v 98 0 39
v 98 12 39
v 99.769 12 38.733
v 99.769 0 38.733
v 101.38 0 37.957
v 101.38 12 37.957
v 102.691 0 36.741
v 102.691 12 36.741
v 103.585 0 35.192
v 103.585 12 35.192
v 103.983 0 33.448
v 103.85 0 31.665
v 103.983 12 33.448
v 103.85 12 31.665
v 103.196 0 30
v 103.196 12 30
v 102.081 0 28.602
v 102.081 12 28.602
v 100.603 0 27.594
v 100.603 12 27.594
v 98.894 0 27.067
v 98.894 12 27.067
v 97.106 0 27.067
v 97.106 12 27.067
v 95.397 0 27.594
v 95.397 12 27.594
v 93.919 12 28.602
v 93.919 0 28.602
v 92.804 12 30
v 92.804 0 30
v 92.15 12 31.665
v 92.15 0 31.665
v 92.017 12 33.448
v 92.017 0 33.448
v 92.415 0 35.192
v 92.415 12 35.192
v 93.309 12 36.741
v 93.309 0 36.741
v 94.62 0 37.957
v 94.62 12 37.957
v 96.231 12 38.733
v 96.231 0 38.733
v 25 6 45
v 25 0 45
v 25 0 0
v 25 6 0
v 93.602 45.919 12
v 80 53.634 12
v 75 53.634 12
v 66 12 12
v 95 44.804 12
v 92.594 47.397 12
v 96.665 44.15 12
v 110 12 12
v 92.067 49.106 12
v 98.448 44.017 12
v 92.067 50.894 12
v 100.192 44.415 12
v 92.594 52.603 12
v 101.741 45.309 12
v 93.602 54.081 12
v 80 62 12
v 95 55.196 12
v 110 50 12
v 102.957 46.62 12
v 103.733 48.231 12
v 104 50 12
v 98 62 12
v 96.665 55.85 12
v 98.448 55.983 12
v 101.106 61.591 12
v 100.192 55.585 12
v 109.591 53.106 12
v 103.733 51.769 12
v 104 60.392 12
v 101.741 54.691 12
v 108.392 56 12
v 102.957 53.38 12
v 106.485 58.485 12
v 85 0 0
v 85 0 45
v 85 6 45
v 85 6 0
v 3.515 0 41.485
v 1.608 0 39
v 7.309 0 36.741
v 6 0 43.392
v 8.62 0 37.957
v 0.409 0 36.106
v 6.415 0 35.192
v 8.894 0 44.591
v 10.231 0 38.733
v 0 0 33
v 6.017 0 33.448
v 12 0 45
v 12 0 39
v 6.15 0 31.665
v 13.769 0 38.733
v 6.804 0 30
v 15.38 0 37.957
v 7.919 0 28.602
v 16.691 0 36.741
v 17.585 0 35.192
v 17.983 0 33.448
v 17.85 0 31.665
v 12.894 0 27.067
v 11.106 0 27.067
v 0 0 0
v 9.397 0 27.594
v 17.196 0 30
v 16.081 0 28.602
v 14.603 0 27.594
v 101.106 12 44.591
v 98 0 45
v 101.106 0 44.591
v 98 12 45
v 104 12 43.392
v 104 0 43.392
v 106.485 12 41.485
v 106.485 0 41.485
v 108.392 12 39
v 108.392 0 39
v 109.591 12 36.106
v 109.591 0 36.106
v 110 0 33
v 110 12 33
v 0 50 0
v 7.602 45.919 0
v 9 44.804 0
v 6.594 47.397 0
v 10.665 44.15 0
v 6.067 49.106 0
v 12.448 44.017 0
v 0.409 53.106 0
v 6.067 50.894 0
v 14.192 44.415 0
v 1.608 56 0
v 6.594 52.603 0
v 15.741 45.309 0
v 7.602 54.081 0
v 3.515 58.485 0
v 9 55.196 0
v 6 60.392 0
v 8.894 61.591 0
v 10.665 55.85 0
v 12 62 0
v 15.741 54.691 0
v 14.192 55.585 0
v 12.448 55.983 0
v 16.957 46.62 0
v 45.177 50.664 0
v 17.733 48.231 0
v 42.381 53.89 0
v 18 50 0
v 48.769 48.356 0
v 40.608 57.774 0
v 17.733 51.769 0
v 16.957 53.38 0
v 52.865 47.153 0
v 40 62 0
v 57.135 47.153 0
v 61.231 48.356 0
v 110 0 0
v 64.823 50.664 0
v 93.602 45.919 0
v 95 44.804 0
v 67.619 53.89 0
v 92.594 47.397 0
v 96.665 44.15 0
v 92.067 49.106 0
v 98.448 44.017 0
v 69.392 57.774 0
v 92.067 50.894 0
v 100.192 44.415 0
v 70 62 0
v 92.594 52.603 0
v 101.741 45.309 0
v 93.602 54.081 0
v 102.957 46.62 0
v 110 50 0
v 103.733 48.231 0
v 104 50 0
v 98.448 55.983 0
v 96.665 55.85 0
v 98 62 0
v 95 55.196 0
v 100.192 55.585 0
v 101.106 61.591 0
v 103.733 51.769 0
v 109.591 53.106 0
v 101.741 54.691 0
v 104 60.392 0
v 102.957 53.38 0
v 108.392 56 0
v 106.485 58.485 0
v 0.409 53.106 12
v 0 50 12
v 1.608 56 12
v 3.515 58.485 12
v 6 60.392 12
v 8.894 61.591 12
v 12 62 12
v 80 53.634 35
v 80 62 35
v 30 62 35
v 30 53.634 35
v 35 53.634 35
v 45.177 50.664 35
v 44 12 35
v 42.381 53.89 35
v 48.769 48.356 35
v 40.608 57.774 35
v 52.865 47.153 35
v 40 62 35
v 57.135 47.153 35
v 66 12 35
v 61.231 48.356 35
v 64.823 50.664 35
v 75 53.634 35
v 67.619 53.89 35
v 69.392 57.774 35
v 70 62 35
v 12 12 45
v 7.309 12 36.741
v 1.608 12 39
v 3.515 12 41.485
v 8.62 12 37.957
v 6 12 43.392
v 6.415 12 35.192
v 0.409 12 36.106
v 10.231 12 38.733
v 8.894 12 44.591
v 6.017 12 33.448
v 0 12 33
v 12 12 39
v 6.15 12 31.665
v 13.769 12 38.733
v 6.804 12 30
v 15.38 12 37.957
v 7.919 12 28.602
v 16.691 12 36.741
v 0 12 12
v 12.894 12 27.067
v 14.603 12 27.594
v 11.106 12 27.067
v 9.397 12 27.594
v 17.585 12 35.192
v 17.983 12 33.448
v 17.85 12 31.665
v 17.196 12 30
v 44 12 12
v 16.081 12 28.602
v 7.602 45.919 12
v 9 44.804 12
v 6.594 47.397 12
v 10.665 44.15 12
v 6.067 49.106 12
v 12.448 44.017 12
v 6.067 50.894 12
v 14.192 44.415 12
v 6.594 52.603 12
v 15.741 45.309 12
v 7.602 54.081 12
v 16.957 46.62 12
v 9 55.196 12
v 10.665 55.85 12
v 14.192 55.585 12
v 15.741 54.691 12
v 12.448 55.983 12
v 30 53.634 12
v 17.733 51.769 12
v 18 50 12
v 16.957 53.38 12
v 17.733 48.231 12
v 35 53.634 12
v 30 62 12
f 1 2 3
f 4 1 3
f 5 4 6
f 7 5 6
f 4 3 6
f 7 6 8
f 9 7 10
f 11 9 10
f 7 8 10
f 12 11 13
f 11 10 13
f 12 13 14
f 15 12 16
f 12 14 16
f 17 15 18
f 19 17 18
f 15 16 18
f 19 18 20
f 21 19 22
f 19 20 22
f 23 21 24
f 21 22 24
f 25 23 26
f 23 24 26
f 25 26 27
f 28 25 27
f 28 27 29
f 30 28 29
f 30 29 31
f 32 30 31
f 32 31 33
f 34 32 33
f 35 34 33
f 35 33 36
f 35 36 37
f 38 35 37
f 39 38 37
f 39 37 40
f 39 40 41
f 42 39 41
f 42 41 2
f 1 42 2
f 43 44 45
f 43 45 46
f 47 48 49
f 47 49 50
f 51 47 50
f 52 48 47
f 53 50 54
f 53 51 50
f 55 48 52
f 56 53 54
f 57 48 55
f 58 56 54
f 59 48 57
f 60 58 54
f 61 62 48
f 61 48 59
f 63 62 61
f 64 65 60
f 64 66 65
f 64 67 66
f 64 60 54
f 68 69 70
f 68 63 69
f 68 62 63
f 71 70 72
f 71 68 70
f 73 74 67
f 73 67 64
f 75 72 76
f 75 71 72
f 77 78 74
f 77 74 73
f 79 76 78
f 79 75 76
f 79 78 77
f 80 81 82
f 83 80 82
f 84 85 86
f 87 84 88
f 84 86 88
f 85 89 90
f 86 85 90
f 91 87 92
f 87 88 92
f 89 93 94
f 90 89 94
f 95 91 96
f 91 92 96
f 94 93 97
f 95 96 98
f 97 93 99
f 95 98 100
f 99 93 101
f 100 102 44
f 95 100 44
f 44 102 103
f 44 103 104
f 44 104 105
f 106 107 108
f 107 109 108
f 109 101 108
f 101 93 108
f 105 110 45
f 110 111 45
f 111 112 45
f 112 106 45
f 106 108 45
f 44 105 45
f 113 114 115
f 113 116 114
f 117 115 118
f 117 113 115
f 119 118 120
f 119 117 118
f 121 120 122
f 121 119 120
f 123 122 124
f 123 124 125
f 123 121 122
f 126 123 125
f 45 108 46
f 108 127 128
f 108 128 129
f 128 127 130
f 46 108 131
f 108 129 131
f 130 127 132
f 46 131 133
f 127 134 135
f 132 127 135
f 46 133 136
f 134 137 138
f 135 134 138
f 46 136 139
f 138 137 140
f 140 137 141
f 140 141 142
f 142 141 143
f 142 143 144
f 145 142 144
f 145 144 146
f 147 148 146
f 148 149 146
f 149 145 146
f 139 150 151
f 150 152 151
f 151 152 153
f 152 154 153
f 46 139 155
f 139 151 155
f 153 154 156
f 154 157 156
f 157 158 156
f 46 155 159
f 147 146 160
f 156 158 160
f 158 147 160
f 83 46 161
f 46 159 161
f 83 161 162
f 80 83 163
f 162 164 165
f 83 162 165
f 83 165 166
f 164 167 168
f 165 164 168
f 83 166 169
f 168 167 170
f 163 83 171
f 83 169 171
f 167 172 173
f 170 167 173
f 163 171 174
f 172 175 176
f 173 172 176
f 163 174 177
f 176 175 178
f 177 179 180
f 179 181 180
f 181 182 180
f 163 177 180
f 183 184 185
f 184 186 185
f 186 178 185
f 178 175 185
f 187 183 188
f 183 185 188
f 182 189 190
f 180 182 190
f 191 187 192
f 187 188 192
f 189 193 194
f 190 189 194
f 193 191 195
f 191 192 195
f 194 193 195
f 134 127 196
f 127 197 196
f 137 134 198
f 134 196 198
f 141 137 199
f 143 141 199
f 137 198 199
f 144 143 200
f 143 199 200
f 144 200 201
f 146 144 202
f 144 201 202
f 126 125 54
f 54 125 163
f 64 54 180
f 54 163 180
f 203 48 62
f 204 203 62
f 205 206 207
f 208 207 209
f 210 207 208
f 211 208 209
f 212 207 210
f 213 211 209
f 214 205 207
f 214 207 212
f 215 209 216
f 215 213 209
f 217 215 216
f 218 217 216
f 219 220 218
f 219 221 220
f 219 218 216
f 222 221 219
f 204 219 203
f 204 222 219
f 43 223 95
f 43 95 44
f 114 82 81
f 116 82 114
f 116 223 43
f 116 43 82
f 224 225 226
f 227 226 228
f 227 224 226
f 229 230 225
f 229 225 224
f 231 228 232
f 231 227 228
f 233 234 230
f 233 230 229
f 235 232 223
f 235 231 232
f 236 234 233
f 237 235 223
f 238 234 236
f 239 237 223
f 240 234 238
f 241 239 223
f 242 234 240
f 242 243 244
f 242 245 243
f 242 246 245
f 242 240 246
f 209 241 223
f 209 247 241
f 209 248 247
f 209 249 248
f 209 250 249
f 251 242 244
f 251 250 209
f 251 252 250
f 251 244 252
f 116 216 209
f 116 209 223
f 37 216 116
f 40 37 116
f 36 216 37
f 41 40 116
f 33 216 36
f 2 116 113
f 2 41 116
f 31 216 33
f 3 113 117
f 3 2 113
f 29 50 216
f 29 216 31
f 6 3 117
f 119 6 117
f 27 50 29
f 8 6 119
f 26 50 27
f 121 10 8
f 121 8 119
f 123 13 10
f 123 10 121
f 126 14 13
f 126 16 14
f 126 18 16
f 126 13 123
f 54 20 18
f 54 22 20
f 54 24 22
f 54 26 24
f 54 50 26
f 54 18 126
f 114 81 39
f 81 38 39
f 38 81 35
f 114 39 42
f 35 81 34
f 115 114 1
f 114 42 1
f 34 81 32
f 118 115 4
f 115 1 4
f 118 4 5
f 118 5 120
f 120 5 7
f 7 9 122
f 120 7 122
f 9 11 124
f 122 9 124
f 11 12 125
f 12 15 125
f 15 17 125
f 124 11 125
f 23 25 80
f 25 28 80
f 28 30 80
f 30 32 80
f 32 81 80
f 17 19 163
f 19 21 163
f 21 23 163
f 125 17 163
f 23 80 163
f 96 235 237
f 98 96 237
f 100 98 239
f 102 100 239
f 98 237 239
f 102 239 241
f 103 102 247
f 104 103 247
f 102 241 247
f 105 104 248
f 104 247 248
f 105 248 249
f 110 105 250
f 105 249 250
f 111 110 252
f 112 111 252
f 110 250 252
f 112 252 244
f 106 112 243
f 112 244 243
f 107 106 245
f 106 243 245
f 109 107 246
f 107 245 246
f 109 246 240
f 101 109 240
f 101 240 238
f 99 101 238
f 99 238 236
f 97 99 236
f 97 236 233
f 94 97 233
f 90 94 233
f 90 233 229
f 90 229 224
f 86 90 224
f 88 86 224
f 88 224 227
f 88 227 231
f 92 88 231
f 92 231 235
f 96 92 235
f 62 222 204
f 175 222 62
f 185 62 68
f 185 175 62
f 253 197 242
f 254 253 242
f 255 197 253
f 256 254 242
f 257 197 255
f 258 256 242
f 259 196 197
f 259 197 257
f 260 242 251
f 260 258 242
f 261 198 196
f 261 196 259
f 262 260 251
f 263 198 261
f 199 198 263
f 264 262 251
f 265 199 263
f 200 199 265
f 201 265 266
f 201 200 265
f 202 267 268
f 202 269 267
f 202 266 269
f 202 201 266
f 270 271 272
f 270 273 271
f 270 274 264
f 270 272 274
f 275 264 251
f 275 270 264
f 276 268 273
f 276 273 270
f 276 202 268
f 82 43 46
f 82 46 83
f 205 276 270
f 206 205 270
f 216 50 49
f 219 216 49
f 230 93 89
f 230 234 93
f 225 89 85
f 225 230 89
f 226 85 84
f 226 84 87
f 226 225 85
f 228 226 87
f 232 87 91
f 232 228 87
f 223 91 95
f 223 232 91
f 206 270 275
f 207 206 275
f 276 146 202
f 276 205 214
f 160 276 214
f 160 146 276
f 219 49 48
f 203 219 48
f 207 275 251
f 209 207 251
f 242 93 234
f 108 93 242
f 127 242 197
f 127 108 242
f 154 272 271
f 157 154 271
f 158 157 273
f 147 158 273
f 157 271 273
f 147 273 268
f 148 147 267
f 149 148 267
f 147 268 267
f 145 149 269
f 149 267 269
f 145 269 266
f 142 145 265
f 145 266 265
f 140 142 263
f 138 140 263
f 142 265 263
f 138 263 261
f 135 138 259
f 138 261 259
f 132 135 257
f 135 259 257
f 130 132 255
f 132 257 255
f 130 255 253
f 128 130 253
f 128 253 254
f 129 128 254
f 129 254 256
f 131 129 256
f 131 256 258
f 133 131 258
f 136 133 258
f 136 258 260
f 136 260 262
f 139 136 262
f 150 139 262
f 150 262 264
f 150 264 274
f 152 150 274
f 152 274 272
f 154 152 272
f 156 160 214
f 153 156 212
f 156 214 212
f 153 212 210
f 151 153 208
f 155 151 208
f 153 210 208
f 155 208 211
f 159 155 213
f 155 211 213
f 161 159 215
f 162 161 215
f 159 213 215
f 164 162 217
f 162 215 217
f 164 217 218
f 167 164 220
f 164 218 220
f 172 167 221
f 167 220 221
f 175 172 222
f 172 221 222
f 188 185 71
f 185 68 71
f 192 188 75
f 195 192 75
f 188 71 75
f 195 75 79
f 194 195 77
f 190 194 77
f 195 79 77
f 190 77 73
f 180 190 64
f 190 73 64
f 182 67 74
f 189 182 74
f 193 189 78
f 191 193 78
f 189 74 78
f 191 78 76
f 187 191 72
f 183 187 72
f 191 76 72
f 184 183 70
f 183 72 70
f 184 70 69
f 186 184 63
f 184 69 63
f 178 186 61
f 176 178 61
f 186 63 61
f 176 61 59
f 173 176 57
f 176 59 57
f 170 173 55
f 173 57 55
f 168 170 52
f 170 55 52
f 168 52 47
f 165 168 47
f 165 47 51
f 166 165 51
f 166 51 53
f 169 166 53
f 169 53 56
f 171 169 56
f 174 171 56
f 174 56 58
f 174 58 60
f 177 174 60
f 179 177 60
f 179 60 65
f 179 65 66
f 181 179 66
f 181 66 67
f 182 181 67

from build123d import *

# Parameters (mm, degrees)
SKETCH1_W           = 110
SKETCH1_H           = 62
BOSS_EXTRUDE1_DEPTH = 12
SKETCH2_W           = 110
SKETCH2_H           = 12
BOSS_EXTRUDE2_DEPTH = 33
BOSS_EXTRUDE3_DEPTH = 23
SKETCH7_R           = 6
CUT_EXTRUDE8_DEPTH  = 131.510535973
SKETCH9_R           = 6
CUT_EXTRUDE9_DEPTH  = 131.510535973
SKETCH10_R          = 6
CUT_EXTRUDE10_DEPTH = 129.937969582
SKETCH11_R          = 6
CUT_EXTRUDE11_DEPTH = 129.937969582
SKETCH15_W          = 60
SKETCH15_H          = 6
CUT_EXTRUDE15_DEPTH = 135.048498686
FILLET3_R           = 12
SKETCH16_R          = 15
CUT_EXTRUDE16_DEPTH = 132.030530793


with BuildPart() as part:
    # Sketch1 → Boss-Extrude1 (new body)
    with BuildSketch(Plane.XY):
        with Locations((55, 31)):
            Rectangle(SKETCH1_W, SKETCH1_H)
    extrude(amount=BOSS_EXTRUDE1_DEPTH)

    # Sketch2 → Boss-Extrude2 (add)
    with BuildSketch(Plane.XY.offset(12)):
        with Locations((55, 6)):
            Rectangle(SKETCH2_W, SKETCH2_H)
    extrude(amount=BOSS_EXTRUDE2_DEPTH)

    # Sketch3 → Boss-Extrude3 (add)
    with BuildSketch(Plane.XY.offset(12)):
        Polygon((75, 53.634363687), (35, 53.634363687), (44, 12), (66, 12), align=None)
        Polygon((80, 62), (30, 62), (30, 53.634363687), (35, 53.634363687), (75, 53.634363687), (80, 53.634363687), align=None)
    extrude(amount=BOSS_EXTRUDE3_DEPTH)

    # Sketch7 → Cut-Extrude8 (cut, through all)
    with BuildSketch(Plane.XY.offset(12)):
        with Locations((12, 50)):
            Circle(SKETCH7_R)
    extrude(amount=-CUT_EXTRUDE8_DEPTH, mode=Mode.SUBTRACT)

    # Sketch9 → Cut-Extrude9 (cut, through all)
    with BuildSketch(Plane.XY.offset(12)):
        with Locations((98, 50)):
            Circle(SKETCH9_R)
    extrude(amount=-CUT_EXTRUDE9_DEPTH, mode=Mode.SUBTRACT)

    # Sketch10 → Cut-Extrude10 (cut, through all)
    with BuildSketch(Plane(origin=(0, 12, 0), x_dir=(1, 0, 0), z_dir=(0, 1, 0))):
        with Locations(Location((12, -33, 0), (0, 0, 270))):
            Circle(SKETCH10_R)
    extrude(amount=-CUT_EXTRUDE10_DEPTH, mode=Mode.SUBTRACT)

    # Sketch11 → Cut-Extrude11 (cut, through all)
    with BuildSketch(Plane(origin=(0, 12, 0), x_dir=(1, 0, 0), z_dir=(0, 1, 0))):
        with Locations(Location((98, -33, 0), (0, 0, 270))):
            Circle(SKETCH11_R)
    extrude(amount=-CUT_EXTRUDE11_DEPTH, mode=Mode.SUBTRACT)

    # Sketch15 → Cut-Extrude15 (cut, through all)
    with BuildSketch(Plane.XY.offset(45)):
        with Locations((55, 3)):
            Rectangle(SKETCH15_W, SKETCH15_H)
    extrude(amount=-CUT_EXTRUDE15_DEPTH, mode=Mode.SUBTRACT)

    # Fillet3
    fillet3_edges = [part.edges().sort_by_distance(p)[0] for p in [
        (0, 6, 45),
        (110, 6, 45),
        (0, 62, 6),
        (110, 62, 6),
    ]]
    fillet(fillet3_edges, radius=FILLET3_R)

    # Sketch16 → Cut-Extrude16 (cut, through all)
    with BuildSketch(Plane.XY.offset(35)):
        with Locations((55, 62)):
            Circle(SKETCH16_R)
    extrude(amount=-CUT_EXTRUDE16_DEPTH, mode=Mode.SUBTRACT)


solid = part.part
